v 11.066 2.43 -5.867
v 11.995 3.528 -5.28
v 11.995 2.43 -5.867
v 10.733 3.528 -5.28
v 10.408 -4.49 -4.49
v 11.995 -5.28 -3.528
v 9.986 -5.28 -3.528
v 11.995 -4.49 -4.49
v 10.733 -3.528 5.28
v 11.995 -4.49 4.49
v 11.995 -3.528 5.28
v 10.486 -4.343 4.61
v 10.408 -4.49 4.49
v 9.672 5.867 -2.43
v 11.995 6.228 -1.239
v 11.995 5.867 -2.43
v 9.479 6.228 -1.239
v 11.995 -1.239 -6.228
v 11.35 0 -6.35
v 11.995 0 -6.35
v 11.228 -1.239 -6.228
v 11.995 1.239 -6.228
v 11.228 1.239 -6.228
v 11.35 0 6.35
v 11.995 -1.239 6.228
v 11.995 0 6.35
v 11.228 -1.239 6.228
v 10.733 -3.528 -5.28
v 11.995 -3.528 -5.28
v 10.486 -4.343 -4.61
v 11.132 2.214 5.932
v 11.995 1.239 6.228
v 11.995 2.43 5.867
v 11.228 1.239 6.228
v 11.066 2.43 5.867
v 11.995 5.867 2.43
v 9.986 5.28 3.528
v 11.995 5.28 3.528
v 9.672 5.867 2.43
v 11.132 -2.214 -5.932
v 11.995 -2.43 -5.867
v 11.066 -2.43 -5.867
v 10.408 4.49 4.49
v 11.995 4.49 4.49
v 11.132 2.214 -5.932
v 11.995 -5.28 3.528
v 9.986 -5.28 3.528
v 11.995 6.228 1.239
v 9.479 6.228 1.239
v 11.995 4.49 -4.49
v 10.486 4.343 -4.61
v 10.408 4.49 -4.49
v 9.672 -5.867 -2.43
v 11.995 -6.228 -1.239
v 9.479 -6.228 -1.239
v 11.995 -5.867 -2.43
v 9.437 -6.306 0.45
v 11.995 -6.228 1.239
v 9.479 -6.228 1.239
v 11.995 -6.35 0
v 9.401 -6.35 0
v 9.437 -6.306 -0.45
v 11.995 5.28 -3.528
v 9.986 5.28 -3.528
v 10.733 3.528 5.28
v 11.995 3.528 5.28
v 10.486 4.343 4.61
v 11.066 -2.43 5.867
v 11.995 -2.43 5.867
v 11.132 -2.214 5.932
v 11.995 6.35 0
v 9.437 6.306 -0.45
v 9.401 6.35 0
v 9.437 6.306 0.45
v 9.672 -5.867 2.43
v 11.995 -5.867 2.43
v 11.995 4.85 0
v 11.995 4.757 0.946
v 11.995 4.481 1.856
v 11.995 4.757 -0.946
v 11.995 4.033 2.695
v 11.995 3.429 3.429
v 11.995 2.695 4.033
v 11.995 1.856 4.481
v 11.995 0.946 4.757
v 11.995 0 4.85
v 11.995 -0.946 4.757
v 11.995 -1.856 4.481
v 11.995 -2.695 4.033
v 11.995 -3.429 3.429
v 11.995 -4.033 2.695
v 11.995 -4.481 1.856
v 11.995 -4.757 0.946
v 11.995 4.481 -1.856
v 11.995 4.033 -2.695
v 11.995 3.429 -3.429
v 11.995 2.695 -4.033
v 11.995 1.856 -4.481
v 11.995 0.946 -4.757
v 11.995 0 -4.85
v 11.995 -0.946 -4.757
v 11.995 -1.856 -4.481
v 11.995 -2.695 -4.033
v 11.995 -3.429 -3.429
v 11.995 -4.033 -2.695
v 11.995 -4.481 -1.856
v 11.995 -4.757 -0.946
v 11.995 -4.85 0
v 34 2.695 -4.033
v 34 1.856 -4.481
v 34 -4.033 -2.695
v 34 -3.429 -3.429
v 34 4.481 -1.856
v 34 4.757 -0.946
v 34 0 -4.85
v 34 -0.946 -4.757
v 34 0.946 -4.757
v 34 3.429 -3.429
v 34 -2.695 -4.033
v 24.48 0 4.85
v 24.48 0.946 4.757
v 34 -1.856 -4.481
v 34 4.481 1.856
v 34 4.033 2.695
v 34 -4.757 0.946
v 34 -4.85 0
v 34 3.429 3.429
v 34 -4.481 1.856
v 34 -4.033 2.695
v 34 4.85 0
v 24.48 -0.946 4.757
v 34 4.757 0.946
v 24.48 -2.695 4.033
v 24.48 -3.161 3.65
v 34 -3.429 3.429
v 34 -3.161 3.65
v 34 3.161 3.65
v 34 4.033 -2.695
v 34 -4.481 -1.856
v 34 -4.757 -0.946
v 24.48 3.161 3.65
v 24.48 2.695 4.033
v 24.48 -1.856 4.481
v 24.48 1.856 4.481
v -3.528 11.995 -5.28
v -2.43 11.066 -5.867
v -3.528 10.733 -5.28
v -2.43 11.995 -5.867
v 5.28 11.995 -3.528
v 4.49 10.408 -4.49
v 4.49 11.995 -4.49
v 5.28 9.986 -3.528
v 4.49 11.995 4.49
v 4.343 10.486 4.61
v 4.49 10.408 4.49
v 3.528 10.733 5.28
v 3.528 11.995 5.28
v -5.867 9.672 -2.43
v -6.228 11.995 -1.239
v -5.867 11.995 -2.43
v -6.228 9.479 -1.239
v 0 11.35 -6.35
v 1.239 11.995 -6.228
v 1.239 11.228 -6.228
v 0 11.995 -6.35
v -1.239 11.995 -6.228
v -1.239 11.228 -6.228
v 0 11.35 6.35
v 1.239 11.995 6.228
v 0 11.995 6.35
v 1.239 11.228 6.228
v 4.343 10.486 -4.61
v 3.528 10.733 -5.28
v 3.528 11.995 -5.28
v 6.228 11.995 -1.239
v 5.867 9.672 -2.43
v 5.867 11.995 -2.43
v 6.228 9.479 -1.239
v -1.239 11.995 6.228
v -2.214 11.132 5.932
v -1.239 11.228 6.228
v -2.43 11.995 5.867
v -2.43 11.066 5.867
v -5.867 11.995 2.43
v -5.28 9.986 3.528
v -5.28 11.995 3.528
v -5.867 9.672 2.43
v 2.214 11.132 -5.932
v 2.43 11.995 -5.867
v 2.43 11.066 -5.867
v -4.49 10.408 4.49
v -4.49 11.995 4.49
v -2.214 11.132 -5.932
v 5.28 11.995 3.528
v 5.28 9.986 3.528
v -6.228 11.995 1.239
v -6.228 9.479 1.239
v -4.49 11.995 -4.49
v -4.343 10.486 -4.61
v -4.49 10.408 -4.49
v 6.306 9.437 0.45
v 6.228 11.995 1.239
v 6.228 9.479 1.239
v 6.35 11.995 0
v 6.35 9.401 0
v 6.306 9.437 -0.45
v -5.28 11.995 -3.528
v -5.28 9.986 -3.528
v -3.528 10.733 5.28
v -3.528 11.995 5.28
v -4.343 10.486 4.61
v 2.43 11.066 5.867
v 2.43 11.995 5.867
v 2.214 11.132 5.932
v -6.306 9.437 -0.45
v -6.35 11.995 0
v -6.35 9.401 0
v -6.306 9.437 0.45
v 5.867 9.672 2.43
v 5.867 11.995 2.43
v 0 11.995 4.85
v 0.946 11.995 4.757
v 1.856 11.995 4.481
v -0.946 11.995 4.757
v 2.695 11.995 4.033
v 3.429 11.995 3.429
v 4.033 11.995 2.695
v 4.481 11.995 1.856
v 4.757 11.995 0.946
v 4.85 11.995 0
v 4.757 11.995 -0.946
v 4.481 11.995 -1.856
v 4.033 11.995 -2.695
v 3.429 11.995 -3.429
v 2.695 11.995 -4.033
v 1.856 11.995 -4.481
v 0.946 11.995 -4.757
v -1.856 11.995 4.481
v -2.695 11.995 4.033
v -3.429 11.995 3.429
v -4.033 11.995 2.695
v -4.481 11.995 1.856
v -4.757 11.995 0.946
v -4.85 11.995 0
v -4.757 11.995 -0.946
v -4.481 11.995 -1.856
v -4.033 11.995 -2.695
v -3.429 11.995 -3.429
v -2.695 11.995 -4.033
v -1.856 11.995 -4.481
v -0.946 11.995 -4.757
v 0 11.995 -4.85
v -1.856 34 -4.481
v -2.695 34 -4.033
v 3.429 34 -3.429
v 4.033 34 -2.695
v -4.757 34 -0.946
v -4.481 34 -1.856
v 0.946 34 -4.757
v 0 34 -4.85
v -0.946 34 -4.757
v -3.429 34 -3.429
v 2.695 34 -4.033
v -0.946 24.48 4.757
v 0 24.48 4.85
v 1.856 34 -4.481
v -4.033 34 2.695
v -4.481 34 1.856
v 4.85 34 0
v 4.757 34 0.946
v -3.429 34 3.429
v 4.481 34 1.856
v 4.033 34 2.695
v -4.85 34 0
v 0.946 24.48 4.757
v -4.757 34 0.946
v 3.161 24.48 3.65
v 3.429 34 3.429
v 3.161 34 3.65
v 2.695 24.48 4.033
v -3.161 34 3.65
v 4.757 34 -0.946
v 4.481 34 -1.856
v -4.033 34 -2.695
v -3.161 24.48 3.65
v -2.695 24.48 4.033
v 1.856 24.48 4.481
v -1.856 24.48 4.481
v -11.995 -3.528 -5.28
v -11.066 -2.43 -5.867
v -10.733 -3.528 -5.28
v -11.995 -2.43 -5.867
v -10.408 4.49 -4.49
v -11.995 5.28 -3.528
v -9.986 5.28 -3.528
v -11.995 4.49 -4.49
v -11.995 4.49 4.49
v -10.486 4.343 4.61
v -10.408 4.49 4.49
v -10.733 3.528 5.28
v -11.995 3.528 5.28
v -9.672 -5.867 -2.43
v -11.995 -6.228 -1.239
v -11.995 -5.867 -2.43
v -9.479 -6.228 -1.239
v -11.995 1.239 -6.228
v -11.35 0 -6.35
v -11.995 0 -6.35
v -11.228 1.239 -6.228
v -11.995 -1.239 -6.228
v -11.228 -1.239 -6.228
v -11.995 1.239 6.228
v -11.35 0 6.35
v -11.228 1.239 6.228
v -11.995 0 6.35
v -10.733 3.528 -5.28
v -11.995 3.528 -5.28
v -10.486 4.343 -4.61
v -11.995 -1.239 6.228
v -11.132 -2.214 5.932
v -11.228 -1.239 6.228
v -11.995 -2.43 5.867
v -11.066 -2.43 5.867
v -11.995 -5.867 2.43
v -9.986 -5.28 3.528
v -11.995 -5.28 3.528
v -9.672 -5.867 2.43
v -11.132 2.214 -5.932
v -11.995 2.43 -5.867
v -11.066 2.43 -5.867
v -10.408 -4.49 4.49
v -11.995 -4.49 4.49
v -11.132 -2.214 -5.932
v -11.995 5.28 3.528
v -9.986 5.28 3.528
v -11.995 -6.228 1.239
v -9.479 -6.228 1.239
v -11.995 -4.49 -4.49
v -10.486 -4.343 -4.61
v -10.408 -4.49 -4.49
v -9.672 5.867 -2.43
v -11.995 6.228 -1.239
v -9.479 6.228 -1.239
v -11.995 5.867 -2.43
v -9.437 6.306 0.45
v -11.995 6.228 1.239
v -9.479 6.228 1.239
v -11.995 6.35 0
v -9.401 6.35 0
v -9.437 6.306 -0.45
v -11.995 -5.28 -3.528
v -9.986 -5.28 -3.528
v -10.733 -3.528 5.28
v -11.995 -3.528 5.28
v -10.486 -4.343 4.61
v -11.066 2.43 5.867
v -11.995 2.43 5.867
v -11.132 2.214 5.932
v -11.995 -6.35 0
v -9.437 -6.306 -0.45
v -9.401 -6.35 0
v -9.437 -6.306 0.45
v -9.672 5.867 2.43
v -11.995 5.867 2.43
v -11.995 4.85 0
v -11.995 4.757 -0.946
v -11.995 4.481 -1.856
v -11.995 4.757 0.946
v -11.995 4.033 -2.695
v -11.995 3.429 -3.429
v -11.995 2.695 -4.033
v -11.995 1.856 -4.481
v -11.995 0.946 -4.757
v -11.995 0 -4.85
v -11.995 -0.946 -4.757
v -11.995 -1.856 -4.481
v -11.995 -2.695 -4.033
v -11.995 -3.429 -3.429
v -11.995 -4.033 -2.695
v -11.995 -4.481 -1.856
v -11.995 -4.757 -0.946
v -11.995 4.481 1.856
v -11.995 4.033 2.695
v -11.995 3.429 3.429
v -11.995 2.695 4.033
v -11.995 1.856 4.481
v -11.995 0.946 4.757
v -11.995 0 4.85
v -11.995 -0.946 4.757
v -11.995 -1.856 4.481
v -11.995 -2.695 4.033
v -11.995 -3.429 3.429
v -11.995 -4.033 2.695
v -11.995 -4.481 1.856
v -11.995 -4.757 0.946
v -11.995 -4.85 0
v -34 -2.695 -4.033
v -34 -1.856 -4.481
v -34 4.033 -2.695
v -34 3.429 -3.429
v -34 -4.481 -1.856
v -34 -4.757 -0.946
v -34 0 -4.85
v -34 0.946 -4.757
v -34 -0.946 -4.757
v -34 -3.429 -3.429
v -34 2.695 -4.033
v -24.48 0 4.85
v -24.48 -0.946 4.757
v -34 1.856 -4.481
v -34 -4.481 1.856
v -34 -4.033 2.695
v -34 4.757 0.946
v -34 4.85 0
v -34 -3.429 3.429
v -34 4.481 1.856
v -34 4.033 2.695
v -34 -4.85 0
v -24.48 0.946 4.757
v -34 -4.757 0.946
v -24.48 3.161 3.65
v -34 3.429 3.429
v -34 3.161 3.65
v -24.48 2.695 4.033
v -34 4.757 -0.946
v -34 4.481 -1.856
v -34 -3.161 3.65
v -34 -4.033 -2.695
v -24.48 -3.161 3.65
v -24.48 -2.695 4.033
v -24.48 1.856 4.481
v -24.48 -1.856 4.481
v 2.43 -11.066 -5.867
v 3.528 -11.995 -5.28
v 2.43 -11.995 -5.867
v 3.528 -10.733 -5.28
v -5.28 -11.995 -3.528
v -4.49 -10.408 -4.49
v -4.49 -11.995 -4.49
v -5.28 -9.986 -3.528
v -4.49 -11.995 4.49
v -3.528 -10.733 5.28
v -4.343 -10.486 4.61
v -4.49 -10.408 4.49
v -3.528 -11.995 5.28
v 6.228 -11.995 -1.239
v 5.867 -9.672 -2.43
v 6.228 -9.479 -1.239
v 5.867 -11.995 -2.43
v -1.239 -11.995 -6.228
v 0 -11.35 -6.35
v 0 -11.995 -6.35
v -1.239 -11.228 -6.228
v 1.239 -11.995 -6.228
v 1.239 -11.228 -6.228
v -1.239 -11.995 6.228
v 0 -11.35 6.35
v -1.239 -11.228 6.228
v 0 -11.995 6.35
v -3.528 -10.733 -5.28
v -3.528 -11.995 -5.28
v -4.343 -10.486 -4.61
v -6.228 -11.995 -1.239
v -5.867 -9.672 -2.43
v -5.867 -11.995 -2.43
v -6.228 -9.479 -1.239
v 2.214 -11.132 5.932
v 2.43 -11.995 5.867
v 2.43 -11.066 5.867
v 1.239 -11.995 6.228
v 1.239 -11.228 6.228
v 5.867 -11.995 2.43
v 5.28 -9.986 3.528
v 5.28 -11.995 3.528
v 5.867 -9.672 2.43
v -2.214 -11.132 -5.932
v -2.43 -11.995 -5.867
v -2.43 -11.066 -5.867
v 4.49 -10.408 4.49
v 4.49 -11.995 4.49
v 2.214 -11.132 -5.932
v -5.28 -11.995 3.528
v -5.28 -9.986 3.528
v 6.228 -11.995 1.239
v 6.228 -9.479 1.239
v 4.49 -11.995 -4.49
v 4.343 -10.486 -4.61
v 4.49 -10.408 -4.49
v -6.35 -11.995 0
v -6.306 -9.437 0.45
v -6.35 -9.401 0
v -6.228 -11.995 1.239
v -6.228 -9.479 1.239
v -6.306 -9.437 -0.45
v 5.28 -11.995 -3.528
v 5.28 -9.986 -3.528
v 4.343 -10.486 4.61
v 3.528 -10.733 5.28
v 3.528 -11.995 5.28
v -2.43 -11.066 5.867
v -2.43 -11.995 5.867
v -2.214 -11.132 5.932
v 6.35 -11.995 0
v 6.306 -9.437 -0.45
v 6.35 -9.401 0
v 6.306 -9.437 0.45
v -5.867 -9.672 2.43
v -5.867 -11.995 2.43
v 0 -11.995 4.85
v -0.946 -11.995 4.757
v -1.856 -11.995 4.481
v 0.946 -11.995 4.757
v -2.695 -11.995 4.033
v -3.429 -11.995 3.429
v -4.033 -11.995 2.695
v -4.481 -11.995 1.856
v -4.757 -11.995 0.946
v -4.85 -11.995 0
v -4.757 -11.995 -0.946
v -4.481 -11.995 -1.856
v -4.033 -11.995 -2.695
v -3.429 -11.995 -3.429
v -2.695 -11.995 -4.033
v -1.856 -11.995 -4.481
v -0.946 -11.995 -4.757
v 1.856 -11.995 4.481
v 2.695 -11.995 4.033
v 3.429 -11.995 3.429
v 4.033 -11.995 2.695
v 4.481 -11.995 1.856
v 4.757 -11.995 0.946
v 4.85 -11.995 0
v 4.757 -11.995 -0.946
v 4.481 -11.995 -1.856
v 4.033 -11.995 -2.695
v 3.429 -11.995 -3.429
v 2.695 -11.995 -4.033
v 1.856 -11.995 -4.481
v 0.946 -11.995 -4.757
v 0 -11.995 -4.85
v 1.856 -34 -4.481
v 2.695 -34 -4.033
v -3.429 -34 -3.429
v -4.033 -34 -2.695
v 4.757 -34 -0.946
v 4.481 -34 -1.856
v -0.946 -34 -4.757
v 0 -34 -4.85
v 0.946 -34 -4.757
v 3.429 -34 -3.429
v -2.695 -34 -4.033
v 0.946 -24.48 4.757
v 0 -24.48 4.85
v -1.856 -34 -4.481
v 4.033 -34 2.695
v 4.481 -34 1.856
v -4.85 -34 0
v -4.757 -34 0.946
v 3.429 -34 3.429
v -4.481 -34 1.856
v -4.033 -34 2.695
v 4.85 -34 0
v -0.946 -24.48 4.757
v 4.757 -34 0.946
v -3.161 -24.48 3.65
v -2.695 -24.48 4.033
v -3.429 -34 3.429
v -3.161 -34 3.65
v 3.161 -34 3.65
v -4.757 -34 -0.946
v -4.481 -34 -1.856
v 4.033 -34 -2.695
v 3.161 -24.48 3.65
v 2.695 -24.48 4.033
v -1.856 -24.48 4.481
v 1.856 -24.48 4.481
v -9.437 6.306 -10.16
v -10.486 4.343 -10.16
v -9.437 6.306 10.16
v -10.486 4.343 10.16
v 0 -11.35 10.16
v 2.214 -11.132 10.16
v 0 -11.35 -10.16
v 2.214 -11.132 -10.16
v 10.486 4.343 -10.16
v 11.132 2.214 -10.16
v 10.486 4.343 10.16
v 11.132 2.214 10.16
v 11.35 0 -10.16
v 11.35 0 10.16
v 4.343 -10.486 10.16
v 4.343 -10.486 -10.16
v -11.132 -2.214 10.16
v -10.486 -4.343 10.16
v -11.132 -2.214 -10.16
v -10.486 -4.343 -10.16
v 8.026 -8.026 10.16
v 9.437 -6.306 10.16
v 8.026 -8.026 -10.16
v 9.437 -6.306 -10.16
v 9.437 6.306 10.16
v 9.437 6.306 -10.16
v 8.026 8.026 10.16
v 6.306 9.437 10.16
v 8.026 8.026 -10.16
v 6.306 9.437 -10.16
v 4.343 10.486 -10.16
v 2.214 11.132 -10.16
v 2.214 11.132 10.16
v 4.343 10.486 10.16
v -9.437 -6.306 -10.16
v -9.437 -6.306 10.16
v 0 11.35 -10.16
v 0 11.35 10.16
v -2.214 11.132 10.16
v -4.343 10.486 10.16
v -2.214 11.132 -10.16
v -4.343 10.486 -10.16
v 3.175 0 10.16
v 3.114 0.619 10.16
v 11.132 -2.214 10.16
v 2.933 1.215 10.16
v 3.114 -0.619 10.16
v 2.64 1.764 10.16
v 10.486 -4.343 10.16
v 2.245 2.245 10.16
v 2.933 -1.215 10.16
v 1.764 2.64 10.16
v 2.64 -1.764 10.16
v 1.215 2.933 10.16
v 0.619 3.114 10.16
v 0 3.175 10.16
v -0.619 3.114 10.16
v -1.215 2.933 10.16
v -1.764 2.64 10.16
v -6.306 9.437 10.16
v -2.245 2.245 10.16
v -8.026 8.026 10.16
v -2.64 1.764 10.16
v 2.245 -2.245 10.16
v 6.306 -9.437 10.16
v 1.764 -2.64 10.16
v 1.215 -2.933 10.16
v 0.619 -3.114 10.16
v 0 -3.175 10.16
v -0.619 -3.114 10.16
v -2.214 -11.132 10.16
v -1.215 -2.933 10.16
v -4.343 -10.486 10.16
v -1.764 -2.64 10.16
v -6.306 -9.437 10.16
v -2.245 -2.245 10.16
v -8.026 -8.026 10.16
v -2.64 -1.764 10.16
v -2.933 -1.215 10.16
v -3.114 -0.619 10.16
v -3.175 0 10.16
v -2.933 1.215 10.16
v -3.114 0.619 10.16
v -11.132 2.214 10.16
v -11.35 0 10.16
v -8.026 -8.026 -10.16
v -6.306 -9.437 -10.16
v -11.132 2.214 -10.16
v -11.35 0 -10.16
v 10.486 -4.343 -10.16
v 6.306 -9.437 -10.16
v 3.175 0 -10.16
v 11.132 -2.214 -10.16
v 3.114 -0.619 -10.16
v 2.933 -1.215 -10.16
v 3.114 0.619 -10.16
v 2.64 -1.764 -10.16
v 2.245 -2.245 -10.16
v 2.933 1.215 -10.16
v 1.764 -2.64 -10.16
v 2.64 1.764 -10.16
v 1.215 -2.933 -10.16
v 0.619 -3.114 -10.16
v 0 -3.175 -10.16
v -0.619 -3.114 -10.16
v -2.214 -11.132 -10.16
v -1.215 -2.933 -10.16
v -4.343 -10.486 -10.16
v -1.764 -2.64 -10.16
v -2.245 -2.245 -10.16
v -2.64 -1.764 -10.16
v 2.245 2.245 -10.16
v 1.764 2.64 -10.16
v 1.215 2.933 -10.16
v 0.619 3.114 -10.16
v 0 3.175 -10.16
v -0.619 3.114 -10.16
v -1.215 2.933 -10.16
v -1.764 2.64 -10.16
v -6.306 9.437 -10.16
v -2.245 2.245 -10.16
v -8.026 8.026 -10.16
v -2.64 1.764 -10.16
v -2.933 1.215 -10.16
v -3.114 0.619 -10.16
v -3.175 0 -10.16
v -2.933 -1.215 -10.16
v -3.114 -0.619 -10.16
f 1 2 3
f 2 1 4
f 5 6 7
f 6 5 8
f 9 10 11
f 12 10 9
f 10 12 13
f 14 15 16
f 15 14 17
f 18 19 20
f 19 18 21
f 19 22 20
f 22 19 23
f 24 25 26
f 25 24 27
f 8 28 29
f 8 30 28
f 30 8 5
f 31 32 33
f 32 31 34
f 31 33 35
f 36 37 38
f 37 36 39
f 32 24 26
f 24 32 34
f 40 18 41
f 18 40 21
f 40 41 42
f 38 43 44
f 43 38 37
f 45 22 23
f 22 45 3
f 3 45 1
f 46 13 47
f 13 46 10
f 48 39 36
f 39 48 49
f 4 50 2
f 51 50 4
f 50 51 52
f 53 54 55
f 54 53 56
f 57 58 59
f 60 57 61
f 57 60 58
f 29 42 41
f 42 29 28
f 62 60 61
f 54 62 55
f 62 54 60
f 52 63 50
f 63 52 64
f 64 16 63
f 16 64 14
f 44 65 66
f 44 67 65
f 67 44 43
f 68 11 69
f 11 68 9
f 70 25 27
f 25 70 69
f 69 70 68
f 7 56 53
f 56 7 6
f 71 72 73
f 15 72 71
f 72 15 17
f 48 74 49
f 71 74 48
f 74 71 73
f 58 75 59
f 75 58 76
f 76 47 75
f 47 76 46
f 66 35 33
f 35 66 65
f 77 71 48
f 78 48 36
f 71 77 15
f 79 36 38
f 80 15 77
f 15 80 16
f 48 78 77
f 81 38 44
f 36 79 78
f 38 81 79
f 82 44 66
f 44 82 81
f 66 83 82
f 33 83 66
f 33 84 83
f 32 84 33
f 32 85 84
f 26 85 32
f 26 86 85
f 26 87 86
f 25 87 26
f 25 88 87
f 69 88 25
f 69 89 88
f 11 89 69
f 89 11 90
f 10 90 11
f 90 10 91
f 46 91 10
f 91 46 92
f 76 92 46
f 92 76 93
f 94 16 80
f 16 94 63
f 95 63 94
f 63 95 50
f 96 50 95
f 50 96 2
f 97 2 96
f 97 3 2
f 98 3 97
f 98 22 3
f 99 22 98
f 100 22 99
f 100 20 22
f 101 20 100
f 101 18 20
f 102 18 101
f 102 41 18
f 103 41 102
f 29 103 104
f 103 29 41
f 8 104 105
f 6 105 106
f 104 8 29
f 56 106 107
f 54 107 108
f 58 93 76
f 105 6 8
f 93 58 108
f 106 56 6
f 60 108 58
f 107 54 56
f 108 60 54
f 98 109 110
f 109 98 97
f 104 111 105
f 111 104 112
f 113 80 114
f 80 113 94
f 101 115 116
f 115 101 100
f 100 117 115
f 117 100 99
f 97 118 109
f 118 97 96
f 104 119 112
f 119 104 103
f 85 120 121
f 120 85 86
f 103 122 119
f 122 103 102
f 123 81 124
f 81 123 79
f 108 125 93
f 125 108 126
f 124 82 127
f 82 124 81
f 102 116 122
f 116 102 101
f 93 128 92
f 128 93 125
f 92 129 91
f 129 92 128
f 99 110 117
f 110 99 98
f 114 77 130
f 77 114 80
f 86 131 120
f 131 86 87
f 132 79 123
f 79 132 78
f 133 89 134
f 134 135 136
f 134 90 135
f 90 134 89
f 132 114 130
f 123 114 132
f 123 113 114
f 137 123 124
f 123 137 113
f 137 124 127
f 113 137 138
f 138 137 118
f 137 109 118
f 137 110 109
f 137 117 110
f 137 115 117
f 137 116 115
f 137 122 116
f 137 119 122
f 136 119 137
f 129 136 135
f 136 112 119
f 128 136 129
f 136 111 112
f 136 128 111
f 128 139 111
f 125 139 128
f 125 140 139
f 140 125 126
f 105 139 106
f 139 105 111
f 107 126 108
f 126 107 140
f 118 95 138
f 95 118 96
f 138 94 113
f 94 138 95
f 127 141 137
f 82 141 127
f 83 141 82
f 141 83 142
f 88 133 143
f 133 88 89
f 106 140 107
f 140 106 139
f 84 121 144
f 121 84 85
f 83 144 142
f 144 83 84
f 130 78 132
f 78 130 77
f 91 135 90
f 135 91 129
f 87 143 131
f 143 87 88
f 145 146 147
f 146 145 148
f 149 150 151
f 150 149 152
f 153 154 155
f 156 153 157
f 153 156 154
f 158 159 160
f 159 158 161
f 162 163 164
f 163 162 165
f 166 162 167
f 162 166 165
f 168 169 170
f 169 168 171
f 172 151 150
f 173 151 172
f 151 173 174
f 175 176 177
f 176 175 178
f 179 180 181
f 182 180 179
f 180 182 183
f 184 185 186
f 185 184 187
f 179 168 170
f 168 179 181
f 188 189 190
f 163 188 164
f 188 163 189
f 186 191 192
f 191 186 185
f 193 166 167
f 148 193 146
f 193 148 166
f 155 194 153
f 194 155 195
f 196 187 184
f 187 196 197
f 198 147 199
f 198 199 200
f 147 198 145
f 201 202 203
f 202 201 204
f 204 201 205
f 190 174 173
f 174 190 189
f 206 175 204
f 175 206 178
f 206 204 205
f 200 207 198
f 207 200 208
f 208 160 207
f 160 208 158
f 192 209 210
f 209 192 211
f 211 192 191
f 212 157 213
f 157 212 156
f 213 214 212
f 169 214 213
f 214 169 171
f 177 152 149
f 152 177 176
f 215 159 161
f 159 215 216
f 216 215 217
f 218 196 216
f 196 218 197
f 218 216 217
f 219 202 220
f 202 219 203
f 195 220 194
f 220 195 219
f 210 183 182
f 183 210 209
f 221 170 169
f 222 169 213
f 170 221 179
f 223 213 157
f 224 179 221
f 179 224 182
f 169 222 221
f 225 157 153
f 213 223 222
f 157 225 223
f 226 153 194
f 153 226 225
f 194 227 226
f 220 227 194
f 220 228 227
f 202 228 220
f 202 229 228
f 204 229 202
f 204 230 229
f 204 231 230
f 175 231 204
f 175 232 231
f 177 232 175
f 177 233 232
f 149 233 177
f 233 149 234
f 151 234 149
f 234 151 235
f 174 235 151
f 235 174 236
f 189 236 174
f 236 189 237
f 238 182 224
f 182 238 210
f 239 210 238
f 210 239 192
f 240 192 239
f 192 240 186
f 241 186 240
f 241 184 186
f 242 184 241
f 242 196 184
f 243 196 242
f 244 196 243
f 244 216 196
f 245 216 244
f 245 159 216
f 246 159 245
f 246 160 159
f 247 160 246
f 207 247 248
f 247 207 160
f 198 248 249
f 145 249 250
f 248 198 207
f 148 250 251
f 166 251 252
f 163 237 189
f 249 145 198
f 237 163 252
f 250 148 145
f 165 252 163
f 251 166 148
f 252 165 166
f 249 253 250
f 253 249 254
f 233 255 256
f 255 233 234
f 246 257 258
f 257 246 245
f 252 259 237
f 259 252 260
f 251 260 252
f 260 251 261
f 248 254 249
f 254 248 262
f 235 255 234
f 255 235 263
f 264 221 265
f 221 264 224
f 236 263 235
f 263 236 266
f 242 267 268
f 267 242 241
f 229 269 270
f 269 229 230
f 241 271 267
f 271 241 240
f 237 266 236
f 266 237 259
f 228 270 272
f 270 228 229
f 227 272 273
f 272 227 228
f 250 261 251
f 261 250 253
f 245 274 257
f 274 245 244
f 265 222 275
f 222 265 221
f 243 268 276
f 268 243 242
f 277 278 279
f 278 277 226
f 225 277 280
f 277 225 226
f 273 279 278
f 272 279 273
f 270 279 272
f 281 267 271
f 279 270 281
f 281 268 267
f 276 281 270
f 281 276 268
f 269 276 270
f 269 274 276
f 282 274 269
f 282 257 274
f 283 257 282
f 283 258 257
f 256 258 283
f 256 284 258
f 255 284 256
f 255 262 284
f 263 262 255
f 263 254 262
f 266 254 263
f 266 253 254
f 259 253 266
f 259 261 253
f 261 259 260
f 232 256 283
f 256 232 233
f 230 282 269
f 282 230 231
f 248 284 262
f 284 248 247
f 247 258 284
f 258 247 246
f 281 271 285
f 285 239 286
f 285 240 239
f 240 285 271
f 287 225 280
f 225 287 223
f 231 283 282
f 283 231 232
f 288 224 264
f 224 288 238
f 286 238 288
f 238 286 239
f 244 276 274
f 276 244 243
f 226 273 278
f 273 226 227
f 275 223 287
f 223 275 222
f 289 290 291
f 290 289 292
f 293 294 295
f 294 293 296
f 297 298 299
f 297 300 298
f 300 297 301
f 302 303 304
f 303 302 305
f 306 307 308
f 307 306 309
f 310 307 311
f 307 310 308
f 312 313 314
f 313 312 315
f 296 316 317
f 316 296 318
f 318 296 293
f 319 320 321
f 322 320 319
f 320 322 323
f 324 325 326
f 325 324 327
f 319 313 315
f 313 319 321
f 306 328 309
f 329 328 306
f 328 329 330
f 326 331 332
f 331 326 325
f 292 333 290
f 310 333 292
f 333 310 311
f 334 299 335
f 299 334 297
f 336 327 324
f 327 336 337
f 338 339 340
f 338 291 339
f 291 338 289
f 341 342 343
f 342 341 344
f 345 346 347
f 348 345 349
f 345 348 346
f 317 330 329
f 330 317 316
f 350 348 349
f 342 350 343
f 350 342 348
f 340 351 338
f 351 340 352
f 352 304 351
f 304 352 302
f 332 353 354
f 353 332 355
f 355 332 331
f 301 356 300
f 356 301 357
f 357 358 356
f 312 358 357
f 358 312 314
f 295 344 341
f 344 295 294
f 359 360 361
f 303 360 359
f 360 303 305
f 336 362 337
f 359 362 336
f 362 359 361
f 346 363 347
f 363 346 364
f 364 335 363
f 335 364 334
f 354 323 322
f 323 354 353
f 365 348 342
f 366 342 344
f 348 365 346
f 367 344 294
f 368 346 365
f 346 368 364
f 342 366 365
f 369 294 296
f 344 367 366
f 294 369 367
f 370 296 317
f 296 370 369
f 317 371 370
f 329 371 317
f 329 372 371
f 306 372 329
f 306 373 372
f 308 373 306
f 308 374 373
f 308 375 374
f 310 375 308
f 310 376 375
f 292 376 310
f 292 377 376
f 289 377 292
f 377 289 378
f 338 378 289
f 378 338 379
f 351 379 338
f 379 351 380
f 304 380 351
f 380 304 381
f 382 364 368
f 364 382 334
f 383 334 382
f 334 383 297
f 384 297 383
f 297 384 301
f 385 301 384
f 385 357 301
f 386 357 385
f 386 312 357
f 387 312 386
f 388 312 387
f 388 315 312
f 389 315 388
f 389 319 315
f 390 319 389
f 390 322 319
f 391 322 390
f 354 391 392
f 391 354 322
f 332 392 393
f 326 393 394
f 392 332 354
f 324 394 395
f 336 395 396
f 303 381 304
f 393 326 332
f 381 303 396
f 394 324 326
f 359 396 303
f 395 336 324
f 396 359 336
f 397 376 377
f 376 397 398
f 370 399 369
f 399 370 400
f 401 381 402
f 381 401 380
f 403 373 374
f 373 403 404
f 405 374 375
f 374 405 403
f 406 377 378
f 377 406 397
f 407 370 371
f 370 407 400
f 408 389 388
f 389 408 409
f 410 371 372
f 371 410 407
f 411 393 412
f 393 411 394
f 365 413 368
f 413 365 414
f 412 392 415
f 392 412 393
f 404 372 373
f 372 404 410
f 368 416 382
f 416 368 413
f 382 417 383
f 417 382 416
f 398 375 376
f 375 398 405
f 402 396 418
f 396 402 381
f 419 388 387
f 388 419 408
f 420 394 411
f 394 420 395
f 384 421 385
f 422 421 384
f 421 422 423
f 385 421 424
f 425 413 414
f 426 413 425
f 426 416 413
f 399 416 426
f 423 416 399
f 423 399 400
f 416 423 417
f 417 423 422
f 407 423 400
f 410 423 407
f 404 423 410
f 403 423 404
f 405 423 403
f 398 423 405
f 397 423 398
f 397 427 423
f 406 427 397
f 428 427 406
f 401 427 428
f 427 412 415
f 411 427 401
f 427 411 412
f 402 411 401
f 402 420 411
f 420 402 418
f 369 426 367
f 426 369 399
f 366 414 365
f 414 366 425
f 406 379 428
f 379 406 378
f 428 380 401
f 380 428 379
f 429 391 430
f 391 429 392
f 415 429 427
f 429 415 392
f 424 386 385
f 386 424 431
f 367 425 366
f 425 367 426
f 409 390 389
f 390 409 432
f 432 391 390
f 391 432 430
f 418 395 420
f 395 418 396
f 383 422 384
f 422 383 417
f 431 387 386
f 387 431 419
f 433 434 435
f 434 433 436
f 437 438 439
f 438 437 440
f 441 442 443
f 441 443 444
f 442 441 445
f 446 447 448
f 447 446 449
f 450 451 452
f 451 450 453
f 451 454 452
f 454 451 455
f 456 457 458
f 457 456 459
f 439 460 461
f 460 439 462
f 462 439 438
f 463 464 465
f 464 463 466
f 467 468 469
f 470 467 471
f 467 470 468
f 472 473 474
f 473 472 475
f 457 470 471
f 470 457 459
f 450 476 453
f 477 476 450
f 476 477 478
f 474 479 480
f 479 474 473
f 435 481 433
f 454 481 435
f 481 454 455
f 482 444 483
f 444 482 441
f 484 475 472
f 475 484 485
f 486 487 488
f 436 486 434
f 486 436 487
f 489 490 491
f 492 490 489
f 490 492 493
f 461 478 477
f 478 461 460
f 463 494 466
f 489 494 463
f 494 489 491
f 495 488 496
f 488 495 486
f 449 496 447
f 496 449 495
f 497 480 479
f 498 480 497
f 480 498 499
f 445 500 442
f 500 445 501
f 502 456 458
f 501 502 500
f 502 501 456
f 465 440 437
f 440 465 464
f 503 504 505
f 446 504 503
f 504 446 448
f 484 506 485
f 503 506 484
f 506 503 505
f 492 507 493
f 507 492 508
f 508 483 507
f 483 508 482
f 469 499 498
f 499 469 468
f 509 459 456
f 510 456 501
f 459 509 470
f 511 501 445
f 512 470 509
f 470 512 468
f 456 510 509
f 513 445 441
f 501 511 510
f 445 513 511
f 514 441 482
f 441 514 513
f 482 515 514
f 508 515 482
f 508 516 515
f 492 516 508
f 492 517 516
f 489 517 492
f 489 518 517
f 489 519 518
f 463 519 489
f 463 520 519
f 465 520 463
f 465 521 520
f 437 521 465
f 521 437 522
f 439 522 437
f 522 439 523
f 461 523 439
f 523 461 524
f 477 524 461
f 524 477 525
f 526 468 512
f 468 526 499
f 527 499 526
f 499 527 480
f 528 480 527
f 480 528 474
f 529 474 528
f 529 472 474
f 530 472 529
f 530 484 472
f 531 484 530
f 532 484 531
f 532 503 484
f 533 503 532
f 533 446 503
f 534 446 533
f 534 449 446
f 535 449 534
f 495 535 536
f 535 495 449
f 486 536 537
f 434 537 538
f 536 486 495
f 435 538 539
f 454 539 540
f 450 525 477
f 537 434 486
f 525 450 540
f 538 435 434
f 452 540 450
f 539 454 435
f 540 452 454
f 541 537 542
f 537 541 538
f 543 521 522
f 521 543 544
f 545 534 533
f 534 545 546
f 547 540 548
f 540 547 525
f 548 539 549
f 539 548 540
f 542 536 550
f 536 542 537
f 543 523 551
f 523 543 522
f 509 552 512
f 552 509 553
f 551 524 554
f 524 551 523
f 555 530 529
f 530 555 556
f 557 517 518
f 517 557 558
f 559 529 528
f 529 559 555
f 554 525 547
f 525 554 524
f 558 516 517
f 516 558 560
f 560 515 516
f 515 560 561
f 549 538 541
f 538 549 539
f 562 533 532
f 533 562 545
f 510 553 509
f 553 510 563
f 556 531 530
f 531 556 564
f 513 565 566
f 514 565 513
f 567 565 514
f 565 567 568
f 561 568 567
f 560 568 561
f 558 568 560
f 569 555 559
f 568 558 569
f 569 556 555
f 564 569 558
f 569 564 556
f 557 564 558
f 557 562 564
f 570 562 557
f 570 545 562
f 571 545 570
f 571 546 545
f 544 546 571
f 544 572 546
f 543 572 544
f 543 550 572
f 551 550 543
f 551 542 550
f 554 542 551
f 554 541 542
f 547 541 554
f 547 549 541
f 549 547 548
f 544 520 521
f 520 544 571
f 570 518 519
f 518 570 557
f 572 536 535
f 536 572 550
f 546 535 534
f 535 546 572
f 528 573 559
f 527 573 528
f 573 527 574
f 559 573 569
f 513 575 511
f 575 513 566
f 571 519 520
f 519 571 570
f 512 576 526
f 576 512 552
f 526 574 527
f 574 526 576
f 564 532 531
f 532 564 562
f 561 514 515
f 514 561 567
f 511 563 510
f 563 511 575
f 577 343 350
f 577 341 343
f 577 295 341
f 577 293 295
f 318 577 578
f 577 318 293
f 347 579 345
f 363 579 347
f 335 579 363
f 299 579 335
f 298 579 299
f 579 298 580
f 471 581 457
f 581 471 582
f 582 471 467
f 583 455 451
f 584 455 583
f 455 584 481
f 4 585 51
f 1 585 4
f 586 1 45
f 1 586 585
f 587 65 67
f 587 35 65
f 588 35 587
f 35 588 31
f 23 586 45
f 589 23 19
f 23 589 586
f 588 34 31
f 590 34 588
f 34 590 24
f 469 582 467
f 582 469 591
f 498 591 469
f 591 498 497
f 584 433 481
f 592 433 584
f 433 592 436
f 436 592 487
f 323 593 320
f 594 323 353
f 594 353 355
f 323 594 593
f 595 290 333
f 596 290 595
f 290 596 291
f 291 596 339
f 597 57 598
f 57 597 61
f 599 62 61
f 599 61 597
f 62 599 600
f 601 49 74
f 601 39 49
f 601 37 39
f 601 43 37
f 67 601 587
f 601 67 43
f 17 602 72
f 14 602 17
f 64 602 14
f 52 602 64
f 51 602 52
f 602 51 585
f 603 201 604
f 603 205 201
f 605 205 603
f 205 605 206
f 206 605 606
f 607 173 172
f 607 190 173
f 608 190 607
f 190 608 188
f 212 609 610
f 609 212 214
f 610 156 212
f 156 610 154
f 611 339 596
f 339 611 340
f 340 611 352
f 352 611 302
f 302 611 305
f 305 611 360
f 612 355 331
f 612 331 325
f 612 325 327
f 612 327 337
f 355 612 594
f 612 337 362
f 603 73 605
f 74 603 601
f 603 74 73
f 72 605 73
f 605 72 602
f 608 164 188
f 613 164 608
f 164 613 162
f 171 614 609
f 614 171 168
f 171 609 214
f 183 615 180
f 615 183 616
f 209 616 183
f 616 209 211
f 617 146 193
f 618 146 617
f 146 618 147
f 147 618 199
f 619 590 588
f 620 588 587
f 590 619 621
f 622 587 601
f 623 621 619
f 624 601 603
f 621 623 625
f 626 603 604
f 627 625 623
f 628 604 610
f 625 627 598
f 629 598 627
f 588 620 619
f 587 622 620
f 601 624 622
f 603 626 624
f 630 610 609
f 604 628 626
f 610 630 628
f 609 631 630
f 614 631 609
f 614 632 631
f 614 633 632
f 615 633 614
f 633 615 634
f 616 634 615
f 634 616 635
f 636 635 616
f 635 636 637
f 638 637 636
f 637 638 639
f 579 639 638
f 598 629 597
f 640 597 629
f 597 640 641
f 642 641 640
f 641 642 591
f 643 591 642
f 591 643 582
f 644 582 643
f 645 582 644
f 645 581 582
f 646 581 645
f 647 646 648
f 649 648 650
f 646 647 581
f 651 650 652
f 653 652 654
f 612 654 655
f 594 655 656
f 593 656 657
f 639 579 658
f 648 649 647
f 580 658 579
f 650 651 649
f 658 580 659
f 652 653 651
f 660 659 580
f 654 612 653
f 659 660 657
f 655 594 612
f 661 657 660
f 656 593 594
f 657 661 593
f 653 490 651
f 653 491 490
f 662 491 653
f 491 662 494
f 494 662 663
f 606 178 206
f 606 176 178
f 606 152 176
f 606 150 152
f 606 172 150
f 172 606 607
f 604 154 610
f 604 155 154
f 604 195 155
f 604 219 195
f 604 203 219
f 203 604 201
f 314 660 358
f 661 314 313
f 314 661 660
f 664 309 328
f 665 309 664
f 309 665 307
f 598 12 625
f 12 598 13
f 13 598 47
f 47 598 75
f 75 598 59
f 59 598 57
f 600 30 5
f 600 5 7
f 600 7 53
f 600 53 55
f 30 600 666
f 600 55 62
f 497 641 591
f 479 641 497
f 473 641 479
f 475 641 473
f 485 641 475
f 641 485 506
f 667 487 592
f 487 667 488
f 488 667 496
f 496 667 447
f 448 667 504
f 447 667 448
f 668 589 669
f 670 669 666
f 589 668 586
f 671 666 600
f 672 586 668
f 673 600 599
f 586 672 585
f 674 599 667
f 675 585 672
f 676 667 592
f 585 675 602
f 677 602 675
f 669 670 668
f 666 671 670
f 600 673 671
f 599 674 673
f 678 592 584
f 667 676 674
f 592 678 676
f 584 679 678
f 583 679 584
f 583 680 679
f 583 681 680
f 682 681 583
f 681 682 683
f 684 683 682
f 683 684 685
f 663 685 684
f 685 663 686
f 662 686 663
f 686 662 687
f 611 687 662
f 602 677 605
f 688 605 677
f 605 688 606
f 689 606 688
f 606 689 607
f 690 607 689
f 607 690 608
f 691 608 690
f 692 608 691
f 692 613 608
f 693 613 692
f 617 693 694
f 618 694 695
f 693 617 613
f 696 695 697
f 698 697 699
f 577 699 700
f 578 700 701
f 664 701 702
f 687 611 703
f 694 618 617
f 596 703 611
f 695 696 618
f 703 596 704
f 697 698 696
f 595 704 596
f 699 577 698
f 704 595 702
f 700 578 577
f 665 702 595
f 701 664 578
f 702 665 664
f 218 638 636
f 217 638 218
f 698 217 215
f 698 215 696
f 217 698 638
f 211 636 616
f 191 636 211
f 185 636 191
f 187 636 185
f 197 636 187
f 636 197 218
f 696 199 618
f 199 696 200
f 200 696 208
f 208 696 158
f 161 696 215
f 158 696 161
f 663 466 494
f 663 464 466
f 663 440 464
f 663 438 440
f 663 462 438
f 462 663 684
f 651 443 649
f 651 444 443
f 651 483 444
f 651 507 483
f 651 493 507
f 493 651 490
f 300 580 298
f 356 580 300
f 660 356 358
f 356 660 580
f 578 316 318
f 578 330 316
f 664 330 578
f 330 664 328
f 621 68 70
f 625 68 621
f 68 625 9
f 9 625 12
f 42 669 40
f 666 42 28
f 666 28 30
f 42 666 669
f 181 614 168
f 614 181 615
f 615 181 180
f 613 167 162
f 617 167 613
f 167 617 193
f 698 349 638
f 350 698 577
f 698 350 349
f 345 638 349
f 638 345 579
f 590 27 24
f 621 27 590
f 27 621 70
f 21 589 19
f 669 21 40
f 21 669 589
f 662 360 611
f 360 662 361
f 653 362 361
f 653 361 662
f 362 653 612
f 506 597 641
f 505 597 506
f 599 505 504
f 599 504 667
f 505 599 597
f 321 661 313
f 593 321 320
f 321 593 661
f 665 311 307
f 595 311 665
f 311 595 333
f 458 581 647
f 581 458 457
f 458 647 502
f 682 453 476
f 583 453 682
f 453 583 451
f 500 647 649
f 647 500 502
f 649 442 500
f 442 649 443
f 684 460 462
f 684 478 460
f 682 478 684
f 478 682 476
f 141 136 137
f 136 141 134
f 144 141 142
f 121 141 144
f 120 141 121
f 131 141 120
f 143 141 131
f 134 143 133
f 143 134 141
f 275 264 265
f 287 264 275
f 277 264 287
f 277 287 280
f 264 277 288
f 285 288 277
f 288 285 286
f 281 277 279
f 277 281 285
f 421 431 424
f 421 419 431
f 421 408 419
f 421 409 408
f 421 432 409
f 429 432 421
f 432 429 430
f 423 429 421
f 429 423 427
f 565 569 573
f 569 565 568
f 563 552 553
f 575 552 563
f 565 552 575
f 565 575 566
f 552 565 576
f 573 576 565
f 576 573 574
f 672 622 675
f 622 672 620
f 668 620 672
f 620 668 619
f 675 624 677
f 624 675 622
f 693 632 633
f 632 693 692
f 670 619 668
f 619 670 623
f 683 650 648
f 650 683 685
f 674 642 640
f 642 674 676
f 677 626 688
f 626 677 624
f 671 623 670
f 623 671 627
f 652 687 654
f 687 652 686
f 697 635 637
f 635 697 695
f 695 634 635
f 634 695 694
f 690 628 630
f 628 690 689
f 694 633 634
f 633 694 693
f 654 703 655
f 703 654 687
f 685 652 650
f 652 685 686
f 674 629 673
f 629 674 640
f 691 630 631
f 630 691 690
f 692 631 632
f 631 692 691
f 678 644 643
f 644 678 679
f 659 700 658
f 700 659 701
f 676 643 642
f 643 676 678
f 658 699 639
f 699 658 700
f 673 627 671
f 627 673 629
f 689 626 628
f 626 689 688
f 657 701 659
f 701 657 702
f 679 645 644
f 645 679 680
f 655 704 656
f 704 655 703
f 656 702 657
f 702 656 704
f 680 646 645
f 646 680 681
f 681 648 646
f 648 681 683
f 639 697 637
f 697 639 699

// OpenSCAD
$fn = 32;

// ----------------------------------------------------------------------
// Cardan cross: 68 mm span, 12.7 mm trunnions
// ----------------------------------------------------------------------

// --- parameters (mm) ---
journal_d = 12.7;         // trunnion diameter
arm_len = 34;             // trunnion length from the centre
step_r = 4.32;            // step position from the centre
step_d = 9.7;             // journal diameter after the step
hub_d = 22.7;             // hub diameter
hub_h = 20.32;            // hub height
bore_d = 6.35;            // hub bore
flat_d = 1.2;             // depth of the journal flat
flat_len = 9.52;          // length of the journal flat

difference() {
  union() {
    /* hub along the joint axis */
    cylinder(h = hub_h, d = hub_d, center = true);
    for (a = [0 : 90 : 270]) rotate([0, 0, a]) {
      /* trunnion, sunk into the hub */
      translate([hub_d / 4, 0, 0]) rotate([0, 90, 0]) cylinder(h = step_r + 2, d = journal_d);
      /* stepped journal out to the tip */
      translate([step_r - 0.5, 0, 0]) rotate([0, 90, 0]) cylinder(h = arm_len + 0.5 - step_r, d = step_d);
    }
  }
  /* lubrication bore through the hub, 2.5 mm clear on both sides */
  translate([0, 0, -hub_h / 2 - 2.5]) cylinder(h = hub_h + 5, d = bore_d);
  /* machined flat on each journal tip */
  for (a = [0 : 90 : 270]) rotate([0, 0, a]) {
    translate([arm_len - flat_len, -step_d, step_d / 2 - flat_d]) cube([flat_len + 0.5, 2 * step_d, flat_d + 2.5]);
  }
}
